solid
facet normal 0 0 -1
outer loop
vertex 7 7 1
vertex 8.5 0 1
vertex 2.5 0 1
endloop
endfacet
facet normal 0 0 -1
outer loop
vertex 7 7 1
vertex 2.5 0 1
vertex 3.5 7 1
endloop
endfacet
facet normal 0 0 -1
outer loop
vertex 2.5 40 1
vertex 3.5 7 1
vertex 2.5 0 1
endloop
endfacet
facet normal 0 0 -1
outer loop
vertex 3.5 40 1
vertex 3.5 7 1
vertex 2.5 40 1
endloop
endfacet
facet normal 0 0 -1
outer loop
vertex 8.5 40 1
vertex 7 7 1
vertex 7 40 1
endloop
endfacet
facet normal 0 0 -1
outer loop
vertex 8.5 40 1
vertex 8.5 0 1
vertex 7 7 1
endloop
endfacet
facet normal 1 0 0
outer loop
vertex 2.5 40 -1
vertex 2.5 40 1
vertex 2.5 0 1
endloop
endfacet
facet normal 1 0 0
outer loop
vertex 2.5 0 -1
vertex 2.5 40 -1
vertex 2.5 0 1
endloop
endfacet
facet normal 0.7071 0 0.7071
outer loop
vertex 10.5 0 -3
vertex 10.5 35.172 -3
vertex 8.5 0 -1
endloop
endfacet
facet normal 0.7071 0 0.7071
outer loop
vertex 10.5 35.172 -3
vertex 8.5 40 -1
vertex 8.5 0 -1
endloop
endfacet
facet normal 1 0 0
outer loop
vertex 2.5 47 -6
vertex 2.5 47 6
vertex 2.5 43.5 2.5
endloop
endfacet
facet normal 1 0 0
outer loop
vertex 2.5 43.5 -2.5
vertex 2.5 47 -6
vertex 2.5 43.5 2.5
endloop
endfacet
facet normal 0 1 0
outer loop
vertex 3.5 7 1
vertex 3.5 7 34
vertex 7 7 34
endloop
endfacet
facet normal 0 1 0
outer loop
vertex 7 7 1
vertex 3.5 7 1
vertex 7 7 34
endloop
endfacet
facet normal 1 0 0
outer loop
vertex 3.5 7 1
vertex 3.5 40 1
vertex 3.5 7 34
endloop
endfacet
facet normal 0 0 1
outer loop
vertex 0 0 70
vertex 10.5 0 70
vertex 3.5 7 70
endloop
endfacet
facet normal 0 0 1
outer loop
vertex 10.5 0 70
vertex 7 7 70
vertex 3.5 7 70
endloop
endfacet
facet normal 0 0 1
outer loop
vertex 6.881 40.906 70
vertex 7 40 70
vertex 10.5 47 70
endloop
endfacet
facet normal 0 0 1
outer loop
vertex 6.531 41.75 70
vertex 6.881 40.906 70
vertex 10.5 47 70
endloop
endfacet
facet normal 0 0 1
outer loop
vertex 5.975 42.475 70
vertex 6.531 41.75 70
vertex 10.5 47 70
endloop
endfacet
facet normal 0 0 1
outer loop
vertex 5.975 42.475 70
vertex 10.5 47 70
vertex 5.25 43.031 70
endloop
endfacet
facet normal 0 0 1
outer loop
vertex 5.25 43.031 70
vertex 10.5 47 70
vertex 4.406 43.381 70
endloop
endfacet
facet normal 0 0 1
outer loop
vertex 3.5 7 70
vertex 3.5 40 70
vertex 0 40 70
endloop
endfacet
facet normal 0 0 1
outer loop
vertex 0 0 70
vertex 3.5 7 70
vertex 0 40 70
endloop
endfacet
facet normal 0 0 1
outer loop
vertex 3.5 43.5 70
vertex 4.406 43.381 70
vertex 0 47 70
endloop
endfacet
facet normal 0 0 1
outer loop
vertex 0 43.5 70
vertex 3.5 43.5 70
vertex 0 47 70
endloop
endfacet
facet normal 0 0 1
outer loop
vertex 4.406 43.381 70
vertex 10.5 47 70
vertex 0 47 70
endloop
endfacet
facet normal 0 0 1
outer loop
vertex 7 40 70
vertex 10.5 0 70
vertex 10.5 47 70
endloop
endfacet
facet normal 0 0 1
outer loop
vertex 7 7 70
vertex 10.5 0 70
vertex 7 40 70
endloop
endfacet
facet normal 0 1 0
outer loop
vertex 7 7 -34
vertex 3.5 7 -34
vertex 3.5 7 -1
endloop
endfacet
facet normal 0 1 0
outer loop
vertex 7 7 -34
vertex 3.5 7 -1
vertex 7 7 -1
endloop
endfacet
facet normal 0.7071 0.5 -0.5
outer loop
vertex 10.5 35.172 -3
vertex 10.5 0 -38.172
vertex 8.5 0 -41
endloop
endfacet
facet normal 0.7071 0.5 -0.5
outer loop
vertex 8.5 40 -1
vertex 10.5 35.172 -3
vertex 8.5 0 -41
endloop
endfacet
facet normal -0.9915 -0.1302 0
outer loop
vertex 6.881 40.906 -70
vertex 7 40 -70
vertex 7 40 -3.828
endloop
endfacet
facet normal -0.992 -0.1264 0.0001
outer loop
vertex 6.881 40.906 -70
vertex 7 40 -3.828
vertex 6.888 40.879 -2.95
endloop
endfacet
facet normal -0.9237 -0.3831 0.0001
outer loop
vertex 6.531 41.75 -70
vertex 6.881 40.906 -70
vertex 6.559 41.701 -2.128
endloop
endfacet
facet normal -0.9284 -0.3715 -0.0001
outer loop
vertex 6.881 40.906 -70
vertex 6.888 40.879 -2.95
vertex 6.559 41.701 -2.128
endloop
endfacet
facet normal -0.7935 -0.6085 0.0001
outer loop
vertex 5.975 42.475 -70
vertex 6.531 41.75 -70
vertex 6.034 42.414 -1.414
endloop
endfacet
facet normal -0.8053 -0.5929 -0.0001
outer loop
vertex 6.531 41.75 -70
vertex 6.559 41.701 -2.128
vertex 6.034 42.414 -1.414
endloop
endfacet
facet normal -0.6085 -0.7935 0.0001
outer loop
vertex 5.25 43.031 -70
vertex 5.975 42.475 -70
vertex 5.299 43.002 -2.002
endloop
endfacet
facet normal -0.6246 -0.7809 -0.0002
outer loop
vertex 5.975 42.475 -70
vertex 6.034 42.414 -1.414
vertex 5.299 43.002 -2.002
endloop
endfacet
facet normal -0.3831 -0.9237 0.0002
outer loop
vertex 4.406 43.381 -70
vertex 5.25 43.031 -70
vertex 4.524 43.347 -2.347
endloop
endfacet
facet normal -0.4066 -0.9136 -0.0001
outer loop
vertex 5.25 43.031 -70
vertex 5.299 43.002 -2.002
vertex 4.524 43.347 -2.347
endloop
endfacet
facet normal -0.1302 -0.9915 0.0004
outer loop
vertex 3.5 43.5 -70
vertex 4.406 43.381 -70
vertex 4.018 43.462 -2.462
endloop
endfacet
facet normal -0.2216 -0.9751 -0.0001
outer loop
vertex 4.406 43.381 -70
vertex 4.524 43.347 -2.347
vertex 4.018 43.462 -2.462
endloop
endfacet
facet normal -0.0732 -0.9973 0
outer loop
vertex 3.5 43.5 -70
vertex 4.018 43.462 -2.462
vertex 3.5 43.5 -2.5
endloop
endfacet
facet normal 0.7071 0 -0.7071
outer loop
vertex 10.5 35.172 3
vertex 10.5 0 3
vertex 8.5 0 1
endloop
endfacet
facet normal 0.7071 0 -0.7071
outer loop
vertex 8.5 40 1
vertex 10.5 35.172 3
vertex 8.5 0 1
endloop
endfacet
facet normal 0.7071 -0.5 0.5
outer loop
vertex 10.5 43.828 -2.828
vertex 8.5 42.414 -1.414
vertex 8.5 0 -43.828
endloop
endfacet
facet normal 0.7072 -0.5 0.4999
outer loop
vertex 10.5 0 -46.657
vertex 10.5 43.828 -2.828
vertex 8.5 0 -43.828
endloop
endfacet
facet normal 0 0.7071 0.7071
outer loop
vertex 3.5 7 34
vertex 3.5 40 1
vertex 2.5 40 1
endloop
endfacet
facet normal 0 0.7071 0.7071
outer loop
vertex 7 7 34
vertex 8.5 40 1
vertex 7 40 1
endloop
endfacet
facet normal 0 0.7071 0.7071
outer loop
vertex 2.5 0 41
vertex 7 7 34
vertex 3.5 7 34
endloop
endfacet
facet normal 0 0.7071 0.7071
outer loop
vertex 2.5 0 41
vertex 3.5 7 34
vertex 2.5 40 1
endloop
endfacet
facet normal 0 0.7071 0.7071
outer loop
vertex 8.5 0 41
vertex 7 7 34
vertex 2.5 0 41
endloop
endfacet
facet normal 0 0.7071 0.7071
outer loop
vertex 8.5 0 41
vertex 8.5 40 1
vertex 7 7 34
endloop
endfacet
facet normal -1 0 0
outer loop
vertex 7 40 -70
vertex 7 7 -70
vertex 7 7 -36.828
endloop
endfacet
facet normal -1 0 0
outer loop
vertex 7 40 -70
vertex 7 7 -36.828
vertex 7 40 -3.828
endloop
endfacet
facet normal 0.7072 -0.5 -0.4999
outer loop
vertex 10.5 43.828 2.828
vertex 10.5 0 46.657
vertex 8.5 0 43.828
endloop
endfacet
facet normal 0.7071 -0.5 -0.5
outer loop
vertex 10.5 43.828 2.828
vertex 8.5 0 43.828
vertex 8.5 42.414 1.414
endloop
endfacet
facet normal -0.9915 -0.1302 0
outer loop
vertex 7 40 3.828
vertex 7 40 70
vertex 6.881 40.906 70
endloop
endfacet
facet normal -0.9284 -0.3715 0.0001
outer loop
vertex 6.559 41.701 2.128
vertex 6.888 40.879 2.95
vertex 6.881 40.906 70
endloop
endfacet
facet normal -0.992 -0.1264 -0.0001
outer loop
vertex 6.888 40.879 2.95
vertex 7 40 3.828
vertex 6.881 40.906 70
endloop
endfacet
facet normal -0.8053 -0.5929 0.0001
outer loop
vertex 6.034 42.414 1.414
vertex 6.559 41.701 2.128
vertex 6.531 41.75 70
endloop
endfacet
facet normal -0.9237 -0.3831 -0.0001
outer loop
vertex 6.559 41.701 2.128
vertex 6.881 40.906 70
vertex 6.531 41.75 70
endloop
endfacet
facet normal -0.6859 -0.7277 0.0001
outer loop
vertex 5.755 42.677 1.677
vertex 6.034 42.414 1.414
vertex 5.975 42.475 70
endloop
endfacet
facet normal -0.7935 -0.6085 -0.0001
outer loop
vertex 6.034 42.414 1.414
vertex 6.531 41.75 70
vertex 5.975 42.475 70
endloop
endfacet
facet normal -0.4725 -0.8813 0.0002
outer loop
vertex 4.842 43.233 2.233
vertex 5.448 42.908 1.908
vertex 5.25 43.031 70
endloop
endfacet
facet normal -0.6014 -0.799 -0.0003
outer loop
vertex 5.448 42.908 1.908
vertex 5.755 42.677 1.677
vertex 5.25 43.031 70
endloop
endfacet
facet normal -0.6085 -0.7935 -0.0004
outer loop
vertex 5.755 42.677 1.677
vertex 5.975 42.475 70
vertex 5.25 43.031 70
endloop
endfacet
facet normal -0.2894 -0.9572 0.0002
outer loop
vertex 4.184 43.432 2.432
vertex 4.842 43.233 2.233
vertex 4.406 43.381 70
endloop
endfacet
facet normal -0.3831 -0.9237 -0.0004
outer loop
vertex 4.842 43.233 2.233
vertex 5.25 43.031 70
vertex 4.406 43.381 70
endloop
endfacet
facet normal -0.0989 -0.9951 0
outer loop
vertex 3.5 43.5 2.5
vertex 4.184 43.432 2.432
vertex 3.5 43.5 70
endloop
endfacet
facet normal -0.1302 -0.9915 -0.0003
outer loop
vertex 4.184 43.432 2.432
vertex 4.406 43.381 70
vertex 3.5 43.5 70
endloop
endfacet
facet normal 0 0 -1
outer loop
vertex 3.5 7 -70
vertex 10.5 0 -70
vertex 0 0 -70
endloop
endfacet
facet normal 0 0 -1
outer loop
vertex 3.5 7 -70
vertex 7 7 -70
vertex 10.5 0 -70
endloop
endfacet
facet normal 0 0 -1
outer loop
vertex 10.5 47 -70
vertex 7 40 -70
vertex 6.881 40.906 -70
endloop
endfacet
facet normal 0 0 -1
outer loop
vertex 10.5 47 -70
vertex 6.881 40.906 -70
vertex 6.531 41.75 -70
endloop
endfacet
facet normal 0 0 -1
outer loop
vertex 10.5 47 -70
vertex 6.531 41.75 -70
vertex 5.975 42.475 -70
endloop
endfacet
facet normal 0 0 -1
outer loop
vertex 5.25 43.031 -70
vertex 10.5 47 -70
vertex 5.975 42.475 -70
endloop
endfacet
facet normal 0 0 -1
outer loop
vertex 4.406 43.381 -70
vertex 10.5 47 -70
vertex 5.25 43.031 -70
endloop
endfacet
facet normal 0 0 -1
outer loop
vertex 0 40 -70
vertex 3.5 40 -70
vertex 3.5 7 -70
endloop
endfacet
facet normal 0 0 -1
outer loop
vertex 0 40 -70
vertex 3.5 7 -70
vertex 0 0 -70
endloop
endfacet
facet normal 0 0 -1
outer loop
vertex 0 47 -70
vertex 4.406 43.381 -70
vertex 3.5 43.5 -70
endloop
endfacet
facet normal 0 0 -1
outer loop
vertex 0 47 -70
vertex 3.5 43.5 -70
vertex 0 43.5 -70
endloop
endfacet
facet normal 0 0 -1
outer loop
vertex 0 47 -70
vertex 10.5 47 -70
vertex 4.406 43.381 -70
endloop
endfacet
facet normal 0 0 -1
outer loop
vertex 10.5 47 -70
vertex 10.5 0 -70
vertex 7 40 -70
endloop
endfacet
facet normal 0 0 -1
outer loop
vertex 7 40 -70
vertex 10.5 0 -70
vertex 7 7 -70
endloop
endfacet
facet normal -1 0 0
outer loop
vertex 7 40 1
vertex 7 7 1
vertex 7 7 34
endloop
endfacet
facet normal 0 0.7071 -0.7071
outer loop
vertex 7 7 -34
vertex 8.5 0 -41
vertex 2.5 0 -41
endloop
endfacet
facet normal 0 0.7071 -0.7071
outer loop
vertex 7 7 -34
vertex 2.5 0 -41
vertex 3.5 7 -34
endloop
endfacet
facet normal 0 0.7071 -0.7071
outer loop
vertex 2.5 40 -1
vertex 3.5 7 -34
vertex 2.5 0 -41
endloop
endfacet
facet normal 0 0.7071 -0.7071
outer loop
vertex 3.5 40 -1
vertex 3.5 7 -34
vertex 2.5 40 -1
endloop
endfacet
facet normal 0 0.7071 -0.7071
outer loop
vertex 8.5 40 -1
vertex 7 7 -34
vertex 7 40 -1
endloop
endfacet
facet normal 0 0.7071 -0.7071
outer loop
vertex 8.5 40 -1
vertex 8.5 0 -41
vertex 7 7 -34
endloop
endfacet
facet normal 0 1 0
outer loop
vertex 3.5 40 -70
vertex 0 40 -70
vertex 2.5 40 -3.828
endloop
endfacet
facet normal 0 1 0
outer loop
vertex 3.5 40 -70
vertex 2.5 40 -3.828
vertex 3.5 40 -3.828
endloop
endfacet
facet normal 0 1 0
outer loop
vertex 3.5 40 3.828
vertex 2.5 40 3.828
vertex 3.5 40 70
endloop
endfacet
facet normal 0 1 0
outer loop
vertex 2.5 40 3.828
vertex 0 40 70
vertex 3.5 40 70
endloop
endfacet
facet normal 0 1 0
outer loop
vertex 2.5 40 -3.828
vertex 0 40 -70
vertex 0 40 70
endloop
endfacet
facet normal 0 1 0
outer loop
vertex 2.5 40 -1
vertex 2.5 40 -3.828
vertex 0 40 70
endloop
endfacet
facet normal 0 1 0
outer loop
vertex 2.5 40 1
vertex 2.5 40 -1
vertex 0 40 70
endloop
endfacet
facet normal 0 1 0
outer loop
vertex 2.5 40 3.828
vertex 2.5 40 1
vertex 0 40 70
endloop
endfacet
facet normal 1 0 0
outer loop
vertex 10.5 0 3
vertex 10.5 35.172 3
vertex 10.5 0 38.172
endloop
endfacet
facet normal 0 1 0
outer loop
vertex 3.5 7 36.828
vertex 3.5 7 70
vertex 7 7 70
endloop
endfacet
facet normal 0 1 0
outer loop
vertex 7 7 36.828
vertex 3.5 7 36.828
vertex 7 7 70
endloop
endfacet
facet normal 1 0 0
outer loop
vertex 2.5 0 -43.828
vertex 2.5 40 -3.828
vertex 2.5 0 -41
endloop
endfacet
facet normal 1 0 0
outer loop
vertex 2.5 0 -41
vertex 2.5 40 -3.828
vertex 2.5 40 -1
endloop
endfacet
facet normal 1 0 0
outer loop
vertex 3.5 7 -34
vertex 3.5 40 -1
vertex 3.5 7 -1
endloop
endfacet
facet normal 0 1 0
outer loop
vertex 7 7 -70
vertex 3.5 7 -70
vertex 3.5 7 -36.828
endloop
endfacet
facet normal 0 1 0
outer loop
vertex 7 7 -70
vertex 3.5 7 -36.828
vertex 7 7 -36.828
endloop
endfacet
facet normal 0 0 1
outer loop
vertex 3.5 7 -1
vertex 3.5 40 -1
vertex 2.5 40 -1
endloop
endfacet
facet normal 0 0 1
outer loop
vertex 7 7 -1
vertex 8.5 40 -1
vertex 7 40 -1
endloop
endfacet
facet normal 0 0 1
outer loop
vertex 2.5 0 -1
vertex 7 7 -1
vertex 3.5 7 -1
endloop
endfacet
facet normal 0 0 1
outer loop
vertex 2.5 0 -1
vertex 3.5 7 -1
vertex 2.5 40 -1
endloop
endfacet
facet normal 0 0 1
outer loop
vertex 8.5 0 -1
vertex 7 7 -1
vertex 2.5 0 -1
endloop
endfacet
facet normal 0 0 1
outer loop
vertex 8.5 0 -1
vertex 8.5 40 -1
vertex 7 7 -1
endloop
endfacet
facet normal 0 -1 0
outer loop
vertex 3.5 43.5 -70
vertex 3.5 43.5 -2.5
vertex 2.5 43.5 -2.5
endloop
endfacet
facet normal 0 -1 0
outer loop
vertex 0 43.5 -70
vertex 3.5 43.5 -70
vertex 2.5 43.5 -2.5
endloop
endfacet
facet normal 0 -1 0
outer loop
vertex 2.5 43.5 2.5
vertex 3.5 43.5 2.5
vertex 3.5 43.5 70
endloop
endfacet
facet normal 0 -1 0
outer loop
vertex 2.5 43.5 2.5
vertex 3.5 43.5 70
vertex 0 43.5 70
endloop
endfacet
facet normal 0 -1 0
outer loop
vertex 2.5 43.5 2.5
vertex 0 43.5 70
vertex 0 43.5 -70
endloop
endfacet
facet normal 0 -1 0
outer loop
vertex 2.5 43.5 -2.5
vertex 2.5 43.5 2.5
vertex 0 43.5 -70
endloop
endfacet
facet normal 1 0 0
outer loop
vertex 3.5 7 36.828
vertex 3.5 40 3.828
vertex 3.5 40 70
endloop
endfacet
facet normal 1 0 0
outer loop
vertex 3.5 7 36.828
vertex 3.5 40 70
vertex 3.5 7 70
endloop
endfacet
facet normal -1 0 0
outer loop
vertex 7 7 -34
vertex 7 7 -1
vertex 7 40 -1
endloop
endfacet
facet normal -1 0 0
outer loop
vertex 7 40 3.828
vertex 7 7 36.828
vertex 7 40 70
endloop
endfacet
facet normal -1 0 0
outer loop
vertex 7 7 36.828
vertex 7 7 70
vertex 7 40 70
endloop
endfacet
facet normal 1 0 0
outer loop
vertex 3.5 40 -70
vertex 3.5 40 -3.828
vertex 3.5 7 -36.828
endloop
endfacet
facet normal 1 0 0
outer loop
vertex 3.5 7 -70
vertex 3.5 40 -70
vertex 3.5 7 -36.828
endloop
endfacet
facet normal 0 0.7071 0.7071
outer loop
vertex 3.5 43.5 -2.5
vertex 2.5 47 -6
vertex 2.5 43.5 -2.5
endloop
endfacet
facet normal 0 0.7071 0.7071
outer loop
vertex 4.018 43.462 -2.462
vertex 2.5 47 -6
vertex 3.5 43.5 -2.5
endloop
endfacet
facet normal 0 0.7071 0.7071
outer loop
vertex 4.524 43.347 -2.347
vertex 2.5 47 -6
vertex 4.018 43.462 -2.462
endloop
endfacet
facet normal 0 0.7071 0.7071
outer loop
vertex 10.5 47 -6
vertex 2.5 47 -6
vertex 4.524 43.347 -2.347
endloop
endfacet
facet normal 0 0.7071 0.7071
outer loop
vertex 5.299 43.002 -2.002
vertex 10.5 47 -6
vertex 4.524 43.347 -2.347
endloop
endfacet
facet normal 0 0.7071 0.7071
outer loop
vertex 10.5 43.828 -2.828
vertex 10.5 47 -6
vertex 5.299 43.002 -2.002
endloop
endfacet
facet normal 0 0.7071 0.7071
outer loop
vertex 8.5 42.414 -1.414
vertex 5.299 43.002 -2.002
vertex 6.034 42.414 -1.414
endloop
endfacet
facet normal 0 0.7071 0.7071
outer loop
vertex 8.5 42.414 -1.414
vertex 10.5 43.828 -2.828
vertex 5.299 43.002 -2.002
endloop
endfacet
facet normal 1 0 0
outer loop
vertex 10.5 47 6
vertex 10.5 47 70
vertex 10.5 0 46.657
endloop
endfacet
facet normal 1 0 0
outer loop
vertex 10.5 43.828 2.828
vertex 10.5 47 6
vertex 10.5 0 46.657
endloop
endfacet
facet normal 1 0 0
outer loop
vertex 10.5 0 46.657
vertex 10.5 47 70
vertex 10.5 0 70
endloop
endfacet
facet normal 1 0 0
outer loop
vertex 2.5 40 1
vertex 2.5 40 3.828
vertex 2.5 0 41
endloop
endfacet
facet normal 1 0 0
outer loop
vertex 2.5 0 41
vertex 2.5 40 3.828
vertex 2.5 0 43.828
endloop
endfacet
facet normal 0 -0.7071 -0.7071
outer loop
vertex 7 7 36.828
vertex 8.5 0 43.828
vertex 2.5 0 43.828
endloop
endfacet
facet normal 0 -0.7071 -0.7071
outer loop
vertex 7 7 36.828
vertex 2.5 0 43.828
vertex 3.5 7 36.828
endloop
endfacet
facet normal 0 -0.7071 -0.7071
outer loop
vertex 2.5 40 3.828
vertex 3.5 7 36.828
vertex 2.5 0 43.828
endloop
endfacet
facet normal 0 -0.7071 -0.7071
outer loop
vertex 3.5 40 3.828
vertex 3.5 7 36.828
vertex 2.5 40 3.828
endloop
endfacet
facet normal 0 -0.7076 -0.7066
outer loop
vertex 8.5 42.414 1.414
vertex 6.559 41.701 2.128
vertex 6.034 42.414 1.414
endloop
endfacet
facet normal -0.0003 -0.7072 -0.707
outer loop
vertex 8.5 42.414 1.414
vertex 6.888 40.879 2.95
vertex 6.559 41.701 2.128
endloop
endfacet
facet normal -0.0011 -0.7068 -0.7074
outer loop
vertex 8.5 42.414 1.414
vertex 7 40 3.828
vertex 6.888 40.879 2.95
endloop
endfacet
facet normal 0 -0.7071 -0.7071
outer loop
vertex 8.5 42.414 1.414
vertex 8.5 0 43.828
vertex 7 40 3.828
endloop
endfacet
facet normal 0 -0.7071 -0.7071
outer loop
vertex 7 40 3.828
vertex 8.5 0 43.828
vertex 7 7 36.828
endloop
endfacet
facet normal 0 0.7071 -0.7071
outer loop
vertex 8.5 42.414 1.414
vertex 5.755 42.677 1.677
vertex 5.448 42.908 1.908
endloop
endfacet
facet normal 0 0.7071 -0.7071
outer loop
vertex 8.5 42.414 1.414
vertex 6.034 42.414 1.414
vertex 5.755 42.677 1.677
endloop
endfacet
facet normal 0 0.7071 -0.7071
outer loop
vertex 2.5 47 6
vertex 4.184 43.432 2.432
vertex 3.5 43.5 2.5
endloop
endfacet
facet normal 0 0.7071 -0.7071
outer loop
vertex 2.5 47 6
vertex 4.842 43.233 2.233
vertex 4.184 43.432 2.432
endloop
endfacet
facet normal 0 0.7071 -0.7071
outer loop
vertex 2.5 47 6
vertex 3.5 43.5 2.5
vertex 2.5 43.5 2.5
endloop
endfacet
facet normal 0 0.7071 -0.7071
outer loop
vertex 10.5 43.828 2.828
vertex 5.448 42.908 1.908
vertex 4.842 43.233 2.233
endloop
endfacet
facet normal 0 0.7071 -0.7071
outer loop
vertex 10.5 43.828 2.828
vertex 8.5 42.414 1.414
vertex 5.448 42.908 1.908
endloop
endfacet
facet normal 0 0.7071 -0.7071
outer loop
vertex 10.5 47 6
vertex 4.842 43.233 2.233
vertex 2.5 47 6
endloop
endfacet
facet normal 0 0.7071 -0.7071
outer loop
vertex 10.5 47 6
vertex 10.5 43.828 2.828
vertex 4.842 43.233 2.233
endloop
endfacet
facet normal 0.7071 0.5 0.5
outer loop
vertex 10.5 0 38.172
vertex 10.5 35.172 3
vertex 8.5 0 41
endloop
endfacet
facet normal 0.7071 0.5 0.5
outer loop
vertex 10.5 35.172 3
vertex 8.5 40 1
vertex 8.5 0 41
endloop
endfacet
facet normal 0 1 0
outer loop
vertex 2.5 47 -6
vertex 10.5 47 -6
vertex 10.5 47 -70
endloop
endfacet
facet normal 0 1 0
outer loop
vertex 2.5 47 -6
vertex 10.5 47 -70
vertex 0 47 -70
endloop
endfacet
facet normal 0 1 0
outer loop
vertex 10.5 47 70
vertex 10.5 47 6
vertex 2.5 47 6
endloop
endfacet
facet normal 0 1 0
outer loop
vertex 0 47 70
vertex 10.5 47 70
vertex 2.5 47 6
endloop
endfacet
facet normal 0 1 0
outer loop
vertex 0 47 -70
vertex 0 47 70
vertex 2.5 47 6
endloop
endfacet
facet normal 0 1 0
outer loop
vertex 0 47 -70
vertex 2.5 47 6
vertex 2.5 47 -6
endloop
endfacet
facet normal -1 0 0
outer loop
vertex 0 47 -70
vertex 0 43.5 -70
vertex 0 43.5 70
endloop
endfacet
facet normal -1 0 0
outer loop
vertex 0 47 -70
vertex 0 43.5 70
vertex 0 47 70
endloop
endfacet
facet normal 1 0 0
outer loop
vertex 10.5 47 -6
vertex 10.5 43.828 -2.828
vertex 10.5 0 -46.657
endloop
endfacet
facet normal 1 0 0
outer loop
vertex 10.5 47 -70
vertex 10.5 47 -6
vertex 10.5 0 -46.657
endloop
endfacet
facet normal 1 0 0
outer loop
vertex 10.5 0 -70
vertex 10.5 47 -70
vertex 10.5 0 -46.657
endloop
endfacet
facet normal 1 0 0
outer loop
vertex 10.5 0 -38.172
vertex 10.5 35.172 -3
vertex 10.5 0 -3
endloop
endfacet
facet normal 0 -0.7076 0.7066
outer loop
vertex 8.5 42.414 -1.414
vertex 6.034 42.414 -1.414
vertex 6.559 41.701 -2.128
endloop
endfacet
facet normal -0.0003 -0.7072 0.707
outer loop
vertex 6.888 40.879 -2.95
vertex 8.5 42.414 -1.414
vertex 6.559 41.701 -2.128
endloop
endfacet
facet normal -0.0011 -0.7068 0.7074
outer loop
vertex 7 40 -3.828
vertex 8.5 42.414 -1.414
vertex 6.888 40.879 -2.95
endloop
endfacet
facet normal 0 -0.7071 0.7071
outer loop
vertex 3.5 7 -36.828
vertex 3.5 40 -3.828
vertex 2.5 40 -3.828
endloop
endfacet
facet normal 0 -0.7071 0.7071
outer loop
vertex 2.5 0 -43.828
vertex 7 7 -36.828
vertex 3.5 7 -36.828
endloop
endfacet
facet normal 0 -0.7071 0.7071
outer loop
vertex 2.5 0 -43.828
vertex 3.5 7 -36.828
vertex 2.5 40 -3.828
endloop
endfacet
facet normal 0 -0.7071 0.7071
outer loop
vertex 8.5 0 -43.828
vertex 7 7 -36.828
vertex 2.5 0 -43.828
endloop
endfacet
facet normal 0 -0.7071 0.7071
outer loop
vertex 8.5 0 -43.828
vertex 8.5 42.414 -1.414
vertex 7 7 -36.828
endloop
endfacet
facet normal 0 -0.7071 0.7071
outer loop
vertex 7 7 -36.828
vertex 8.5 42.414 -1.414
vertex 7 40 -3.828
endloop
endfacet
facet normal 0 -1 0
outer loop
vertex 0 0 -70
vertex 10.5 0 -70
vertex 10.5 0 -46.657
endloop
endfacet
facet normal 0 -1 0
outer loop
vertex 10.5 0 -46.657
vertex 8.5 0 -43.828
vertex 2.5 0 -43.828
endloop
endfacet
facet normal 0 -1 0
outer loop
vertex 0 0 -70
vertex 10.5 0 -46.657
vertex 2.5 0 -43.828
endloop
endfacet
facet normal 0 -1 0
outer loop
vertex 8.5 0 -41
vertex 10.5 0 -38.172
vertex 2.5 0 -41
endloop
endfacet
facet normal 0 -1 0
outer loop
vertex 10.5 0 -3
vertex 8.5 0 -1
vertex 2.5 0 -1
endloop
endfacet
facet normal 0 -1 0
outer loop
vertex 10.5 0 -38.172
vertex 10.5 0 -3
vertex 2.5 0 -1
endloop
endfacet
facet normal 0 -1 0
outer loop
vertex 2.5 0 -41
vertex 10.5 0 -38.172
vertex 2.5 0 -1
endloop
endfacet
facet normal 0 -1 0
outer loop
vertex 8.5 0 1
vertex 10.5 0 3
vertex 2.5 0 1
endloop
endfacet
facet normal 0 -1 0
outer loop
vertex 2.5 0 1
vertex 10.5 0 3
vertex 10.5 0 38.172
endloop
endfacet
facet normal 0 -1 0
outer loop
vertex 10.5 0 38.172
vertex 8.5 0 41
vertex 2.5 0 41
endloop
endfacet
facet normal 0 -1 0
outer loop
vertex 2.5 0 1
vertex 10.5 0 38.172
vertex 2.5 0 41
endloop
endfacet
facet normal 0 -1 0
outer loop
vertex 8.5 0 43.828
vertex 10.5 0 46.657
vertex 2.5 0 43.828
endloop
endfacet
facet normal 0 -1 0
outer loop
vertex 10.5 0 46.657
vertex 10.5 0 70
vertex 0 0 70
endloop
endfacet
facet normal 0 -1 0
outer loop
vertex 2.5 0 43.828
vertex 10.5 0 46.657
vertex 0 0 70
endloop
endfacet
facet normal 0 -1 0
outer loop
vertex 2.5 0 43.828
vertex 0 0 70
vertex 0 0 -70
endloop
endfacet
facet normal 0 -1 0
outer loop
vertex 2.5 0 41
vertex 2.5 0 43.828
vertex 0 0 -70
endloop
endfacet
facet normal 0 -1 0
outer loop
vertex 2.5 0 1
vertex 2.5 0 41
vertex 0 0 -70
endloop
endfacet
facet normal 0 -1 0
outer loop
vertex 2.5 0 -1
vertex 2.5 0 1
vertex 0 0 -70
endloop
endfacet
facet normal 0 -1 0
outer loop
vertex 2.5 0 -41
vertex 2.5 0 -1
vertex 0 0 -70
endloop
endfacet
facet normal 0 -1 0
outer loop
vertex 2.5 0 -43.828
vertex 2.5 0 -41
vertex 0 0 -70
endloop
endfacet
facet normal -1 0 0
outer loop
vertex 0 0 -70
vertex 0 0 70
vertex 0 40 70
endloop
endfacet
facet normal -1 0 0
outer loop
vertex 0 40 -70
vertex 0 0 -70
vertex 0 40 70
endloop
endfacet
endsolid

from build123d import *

# Parameters (mm, degrees)
PAD_DEPTH    = 70
POCKET_DEPTH = 8
CHAMFER_SIZE = 2


with BuildPart() as part:
    # Sketch → Pad (new body, symmetric)
    with BuildSketch(Plane.XY):
        with BuildLine():
            Line((0, 0), (0, 40))
            Line((0, 40), (3.5, 40))
            Line((3.5, 40), (3.5, 7))
            Line((3.5, 7), (7, 7))
            Line((7, 7), (7, 40))
            ThreePointArc((7, 40), (5.974874, 42.474874), (3.5, 43.5))
            Line((3.5, 43.5), (0, 43.5))
            Line((0, 43.5), (0, 47))
            Line((10.5, 47), (0, 47))
            Line((10.5, 47), (10.5, 0))
            Line((10.5, 0), (0, 0))
        make_face()
    extrude(amount=PAD_DEPTH, both=True)

    # Sketch001 (on Face1 of Pad) → Pocket (cut)
    with BuildSketch(Plane.YZ.offset(10.5)):
        Polygon((0, 1), (40, 1), (0, 41), (0, 43.828427), (42.414214, 1.414214), (62.414214, 21.414214), (62.414214, -21.414214), (42.414214, -1.414214), (0, -43.828427), (0, -41), (40, -1), (0, -1), align=None)
    extrude(amount=-POCKET_DEPTH, mode=Mode.SUBTRACT)

    # Chamfer
    chamfer_edges = [part.edges().sort_by_distance(p)[0] for p in [
        (10.5, 20, 1),
        (10.5, 20, -1),
        (10.5, 20, -21),
        (10.5, 21.207107, -22.62132),
        (10.5, 20, 21),
        (10.5, 21.207107, 22.62132),
    ]]
    chamfer(chamfer_edges, length=CHAMFER_SIZE)


solid = part.part
